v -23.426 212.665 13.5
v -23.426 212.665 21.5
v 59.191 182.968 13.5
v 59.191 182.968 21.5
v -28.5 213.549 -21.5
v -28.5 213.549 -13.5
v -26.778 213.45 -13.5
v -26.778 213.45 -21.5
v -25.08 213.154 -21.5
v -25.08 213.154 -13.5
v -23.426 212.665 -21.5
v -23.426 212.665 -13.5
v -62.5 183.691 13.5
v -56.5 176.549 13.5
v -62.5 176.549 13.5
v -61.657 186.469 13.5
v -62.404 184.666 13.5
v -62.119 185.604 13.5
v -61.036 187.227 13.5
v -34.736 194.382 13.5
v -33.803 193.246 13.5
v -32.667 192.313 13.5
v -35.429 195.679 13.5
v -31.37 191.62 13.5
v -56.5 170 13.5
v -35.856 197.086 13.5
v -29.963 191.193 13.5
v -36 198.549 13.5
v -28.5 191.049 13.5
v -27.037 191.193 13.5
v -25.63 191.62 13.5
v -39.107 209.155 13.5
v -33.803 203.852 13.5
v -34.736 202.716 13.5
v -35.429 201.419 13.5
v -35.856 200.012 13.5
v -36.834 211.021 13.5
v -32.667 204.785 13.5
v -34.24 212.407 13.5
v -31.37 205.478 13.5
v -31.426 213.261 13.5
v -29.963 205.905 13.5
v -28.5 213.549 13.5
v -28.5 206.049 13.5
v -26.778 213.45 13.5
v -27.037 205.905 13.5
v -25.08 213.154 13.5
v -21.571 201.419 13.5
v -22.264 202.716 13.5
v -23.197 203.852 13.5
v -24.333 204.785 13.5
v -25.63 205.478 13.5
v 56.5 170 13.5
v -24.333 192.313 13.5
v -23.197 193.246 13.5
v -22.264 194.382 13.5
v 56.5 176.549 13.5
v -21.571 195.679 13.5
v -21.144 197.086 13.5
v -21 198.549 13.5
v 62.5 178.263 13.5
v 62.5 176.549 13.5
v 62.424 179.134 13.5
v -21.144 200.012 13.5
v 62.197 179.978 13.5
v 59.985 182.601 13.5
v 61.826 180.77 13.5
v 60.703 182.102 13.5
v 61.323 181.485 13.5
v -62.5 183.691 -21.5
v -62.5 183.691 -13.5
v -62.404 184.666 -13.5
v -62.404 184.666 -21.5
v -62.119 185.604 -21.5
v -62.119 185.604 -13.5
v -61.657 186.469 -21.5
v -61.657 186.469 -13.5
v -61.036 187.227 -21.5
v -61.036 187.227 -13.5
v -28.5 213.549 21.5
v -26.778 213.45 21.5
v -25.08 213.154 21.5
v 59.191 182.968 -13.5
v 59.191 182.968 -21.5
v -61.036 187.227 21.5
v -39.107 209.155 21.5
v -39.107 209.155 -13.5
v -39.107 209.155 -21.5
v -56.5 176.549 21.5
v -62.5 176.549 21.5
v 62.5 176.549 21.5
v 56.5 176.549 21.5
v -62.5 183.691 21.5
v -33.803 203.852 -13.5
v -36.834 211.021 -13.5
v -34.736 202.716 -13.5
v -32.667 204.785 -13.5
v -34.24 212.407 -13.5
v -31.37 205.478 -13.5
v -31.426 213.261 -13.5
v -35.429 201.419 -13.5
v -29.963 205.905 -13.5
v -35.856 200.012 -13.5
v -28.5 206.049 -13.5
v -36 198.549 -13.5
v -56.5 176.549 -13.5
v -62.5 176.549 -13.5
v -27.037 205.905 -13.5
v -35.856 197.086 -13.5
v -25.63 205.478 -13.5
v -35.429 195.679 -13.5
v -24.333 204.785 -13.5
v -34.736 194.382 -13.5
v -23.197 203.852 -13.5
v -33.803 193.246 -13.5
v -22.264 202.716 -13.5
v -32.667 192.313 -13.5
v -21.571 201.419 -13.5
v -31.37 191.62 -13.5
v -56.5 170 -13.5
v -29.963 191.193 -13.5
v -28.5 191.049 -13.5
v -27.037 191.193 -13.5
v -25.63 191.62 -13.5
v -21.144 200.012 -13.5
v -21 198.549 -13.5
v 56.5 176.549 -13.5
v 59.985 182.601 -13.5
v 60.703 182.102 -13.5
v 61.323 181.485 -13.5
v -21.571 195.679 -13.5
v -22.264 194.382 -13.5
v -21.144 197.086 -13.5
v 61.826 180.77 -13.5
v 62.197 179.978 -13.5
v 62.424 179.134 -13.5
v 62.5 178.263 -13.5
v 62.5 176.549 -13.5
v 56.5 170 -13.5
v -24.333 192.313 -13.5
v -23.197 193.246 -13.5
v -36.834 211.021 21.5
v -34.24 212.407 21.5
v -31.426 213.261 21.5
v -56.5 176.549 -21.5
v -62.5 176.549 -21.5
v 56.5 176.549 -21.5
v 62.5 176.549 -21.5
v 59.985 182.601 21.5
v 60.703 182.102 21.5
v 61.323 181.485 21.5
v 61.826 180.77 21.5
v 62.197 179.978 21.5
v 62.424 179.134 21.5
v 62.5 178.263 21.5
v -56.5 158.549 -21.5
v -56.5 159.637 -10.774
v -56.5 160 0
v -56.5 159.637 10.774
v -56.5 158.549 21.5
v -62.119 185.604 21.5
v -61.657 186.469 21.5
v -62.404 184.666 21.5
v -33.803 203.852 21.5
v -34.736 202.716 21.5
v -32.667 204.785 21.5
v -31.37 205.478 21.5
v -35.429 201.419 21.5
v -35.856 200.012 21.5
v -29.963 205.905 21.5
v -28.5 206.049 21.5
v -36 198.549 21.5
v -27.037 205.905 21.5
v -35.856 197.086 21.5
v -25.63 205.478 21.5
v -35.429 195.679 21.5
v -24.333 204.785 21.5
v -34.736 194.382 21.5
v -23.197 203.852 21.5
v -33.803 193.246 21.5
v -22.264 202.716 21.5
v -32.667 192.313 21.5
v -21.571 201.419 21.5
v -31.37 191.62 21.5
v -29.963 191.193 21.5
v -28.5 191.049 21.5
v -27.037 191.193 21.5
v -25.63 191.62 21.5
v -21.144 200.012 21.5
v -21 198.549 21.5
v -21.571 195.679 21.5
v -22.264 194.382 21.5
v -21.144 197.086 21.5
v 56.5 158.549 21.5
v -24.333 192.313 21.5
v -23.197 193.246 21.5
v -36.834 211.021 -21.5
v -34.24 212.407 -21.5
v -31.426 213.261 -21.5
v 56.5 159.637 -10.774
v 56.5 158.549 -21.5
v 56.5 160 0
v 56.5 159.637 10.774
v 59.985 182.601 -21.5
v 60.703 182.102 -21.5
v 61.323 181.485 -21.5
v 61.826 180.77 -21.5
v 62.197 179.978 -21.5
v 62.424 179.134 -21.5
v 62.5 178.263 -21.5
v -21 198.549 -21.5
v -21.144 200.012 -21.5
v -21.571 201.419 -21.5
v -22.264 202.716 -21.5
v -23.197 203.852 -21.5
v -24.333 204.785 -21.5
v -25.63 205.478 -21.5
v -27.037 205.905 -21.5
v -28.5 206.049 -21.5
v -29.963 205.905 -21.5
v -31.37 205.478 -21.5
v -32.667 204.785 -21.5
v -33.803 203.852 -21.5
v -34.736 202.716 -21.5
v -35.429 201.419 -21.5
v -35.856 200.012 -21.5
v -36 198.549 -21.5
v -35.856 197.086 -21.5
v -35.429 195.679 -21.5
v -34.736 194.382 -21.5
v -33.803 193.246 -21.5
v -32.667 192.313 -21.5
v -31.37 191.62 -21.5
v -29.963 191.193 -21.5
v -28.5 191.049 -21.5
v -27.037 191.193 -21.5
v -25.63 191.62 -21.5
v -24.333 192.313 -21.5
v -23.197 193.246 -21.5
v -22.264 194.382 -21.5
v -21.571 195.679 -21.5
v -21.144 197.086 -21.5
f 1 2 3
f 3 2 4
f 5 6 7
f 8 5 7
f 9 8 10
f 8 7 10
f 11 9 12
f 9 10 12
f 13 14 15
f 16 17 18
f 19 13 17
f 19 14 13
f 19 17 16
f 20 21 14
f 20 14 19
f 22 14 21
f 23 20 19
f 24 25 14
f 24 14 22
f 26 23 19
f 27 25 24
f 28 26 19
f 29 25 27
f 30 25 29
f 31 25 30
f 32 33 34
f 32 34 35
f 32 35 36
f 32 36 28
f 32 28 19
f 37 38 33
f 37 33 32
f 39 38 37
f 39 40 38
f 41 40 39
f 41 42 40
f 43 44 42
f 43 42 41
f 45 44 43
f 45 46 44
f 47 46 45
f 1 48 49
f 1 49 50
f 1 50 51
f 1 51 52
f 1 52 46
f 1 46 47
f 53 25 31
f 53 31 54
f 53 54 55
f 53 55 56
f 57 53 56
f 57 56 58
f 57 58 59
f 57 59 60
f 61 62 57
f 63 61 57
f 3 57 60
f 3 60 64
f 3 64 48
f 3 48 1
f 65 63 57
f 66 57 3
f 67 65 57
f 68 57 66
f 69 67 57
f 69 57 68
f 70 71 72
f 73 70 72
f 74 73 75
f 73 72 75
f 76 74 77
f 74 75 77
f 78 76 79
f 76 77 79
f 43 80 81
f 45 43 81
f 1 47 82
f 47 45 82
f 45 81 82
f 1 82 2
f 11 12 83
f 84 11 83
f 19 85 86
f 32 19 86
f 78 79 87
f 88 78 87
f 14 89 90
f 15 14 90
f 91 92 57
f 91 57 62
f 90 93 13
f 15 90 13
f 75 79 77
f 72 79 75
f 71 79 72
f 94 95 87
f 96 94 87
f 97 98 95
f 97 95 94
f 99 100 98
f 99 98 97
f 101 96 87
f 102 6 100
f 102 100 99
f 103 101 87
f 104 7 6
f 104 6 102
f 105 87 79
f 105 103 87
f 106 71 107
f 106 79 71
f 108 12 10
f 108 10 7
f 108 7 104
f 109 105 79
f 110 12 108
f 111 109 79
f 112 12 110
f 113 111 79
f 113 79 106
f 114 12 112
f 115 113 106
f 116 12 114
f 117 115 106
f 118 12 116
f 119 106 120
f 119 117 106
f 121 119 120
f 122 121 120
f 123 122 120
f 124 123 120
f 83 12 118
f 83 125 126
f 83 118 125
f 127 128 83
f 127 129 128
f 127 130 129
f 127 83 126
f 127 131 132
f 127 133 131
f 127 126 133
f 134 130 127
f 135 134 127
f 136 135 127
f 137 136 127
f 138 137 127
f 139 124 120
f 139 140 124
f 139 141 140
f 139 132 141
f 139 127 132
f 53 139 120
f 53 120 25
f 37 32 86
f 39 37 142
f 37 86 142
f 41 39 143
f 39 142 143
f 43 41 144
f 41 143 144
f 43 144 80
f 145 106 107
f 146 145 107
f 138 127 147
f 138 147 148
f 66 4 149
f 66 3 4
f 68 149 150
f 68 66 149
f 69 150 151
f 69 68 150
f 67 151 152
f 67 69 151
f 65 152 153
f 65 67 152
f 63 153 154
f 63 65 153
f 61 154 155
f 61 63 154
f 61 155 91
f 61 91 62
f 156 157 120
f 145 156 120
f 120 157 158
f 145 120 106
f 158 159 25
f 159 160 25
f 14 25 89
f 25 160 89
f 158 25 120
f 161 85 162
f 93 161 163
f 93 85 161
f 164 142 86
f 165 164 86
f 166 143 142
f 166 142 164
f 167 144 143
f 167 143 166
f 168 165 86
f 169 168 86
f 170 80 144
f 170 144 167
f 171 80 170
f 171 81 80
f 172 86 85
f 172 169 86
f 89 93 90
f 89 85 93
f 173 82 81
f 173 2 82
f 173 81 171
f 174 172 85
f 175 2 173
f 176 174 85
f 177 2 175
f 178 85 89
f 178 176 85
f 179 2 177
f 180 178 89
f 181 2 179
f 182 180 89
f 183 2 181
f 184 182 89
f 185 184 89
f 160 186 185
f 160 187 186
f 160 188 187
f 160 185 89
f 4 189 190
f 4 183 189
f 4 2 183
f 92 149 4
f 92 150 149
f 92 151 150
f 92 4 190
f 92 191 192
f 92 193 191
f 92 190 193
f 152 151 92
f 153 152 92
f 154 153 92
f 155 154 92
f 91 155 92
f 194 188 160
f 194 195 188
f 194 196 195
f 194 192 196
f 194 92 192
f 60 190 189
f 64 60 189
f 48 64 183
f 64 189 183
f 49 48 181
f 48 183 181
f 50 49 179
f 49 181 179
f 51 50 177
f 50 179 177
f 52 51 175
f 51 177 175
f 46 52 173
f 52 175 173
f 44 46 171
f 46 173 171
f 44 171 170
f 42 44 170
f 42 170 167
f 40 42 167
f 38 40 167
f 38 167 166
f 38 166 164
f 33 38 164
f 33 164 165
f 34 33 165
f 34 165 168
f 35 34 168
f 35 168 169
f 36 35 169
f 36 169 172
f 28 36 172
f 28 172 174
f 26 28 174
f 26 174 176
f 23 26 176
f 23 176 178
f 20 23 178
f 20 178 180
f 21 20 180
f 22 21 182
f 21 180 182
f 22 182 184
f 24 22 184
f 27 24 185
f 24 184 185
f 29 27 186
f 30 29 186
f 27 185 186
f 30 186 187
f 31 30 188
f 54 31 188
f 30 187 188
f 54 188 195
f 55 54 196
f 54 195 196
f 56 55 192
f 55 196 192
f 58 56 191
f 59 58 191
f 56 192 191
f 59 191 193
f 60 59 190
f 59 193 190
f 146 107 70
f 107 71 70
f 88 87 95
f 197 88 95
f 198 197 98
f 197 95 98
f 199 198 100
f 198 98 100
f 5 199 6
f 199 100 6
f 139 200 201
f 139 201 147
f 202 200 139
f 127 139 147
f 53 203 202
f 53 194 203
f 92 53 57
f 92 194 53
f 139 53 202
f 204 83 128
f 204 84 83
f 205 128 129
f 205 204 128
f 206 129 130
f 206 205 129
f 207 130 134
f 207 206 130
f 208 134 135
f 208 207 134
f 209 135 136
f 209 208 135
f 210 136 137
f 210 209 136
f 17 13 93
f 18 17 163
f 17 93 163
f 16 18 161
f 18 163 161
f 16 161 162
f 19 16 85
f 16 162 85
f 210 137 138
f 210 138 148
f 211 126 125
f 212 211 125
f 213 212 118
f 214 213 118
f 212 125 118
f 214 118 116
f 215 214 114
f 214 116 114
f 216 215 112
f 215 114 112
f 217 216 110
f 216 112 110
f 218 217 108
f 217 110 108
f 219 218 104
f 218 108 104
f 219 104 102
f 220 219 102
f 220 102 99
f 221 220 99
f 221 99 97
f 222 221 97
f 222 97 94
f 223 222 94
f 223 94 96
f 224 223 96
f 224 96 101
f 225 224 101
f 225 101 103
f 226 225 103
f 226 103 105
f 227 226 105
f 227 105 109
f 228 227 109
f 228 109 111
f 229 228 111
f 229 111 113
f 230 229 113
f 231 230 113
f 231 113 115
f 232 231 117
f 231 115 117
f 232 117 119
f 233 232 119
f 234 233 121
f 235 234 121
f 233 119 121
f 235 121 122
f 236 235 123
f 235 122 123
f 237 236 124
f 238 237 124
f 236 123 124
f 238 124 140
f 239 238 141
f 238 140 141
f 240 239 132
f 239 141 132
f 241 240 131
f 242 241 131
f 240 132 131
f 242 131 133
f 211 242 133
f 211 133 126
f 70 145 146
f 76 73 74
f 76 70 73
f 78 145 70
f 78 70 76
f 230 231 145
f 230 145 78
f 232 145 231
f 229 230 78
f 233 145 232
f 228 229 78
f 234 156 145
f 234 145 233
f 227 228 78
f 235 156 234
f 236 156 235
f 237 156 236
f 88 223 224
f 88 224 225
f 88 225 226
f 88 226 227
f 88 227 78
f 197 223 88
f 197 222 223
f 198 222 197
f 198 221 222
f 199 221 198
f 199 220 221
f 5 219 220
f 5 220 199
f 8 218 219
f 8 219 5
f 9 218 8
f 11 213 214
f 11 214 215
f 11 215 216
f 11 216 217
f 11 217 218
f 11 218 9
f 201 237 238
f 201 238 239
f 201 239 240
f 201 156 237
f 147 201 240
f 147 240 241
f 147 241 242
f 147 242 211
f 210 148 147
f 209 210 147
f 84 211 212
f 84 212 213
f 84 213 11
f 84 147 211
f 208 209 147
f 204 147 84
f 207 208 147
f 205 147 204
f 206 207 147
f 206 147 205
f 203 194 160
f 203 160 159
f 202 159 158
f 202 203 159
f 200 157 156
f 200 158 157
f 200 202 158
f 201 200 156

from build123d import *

# Parameters (mm, degrees)
BOSS_EXTRUDE2_DEPTH = 62.5
SKETCH4_R           = 7.5
SKETCH4_W           = 6
SKETCH4_H           = 18
CUT_EXTRUDE1_DEPTH  = 125
FILLET1_R           = 5


with BuildPart() as part:
    # Sketch3 → Boss-Extrude2 (new body, symmetric)
    with BuildSketch(Plane(origin=(0, 0, 0), x_dir=(0, 0, -1), z_dir=(1, 0, 0))):
        with BuildLine():
            Line((-21.5, 213.548888359), (-21.5, 158.548888359))
            ThreePointArc((-21.5, 158.548888359), (0, 160), (21.5, 158.548888359))
            Line((21.5, 158.548888359), (21.5, 213.548888359))
            Line((21.5, 213.548888359), (13.5, 213.548888359))
            Line((13.5, 213.548888359), (13.5, 170))
            Line((13.5, 170), (-13.5, 170))
            Line((-13.5, 170), (-13.5, 213.548888359))
            Line((-13.5, 213.548888359), (-21.5, 213.548888359))
        make_face()
    extrude(amount=BOSS_EXTRUDE2_DEPTH, both=True)

    # Sketch4 → Cut-Extrude1 (cut)
    with BuildSketch(Plane.XY.offset(21.5)):
        with BuildLine():
            Line((62.5, 213.548888359), (-28.5, 213.548888359))
            ThreePointArc((-28.5, 213.548888359), (-25.924800571, 213.326179989), (-23.426070272, 212.66466808))
            Line((-23.426070272, 212.66466808), (62.5, 181.778464764))
            Line((62.5, 181.778464764), (62.5, 213.548888359))
        make_face()
        with BuildLine():
            ThreePointArc((-62.5, 183.691023983), (-62.119397663, 185.604441145), (-61.035533906, 187.226557889))
            Line((-61.035533906, 187.226557889), (-39.106601718, 209.155490077))
            ThreePointArc((-39.106601718, 209.155490077), (-34.240251485, 212.407081347), (-28.5, 213.548888359))
            Line((-28.5, 213.548888359), (-62.5, 213.548888359))
            Line((-62.5, 213.548888359), (-62.5, 183.691023983))
        make_face()
        Polygon((-56.5, 176.548888359), (-62.5, 176.548888359), (-62.5, 173.092612301), (-62.5, 158.548888359), (-56.5, 158.548888359), align=None)
        with Locations((-28.5, 198.548888359)):
            Circle(SKETCH4_R)
        with Locations((59.5, 167.548888359)):
            Rectangle(SKETCH4_W, SKETCH4_H)
    extrude(amount=-CUT_EXTRUDE1_DEPTH, mode=Mode.SUBTRACT)

    # Fillet1
    fillet1_edges = [part.edges().sort_by_distance(p)[0] for p in [
        (62.5, 181.778464764, 17.5),
        (62.5, 181.778464764, -17.5),
    ]]
    fillet(fillet1_edges, radius=FILLET1_R)


solid = part.part
